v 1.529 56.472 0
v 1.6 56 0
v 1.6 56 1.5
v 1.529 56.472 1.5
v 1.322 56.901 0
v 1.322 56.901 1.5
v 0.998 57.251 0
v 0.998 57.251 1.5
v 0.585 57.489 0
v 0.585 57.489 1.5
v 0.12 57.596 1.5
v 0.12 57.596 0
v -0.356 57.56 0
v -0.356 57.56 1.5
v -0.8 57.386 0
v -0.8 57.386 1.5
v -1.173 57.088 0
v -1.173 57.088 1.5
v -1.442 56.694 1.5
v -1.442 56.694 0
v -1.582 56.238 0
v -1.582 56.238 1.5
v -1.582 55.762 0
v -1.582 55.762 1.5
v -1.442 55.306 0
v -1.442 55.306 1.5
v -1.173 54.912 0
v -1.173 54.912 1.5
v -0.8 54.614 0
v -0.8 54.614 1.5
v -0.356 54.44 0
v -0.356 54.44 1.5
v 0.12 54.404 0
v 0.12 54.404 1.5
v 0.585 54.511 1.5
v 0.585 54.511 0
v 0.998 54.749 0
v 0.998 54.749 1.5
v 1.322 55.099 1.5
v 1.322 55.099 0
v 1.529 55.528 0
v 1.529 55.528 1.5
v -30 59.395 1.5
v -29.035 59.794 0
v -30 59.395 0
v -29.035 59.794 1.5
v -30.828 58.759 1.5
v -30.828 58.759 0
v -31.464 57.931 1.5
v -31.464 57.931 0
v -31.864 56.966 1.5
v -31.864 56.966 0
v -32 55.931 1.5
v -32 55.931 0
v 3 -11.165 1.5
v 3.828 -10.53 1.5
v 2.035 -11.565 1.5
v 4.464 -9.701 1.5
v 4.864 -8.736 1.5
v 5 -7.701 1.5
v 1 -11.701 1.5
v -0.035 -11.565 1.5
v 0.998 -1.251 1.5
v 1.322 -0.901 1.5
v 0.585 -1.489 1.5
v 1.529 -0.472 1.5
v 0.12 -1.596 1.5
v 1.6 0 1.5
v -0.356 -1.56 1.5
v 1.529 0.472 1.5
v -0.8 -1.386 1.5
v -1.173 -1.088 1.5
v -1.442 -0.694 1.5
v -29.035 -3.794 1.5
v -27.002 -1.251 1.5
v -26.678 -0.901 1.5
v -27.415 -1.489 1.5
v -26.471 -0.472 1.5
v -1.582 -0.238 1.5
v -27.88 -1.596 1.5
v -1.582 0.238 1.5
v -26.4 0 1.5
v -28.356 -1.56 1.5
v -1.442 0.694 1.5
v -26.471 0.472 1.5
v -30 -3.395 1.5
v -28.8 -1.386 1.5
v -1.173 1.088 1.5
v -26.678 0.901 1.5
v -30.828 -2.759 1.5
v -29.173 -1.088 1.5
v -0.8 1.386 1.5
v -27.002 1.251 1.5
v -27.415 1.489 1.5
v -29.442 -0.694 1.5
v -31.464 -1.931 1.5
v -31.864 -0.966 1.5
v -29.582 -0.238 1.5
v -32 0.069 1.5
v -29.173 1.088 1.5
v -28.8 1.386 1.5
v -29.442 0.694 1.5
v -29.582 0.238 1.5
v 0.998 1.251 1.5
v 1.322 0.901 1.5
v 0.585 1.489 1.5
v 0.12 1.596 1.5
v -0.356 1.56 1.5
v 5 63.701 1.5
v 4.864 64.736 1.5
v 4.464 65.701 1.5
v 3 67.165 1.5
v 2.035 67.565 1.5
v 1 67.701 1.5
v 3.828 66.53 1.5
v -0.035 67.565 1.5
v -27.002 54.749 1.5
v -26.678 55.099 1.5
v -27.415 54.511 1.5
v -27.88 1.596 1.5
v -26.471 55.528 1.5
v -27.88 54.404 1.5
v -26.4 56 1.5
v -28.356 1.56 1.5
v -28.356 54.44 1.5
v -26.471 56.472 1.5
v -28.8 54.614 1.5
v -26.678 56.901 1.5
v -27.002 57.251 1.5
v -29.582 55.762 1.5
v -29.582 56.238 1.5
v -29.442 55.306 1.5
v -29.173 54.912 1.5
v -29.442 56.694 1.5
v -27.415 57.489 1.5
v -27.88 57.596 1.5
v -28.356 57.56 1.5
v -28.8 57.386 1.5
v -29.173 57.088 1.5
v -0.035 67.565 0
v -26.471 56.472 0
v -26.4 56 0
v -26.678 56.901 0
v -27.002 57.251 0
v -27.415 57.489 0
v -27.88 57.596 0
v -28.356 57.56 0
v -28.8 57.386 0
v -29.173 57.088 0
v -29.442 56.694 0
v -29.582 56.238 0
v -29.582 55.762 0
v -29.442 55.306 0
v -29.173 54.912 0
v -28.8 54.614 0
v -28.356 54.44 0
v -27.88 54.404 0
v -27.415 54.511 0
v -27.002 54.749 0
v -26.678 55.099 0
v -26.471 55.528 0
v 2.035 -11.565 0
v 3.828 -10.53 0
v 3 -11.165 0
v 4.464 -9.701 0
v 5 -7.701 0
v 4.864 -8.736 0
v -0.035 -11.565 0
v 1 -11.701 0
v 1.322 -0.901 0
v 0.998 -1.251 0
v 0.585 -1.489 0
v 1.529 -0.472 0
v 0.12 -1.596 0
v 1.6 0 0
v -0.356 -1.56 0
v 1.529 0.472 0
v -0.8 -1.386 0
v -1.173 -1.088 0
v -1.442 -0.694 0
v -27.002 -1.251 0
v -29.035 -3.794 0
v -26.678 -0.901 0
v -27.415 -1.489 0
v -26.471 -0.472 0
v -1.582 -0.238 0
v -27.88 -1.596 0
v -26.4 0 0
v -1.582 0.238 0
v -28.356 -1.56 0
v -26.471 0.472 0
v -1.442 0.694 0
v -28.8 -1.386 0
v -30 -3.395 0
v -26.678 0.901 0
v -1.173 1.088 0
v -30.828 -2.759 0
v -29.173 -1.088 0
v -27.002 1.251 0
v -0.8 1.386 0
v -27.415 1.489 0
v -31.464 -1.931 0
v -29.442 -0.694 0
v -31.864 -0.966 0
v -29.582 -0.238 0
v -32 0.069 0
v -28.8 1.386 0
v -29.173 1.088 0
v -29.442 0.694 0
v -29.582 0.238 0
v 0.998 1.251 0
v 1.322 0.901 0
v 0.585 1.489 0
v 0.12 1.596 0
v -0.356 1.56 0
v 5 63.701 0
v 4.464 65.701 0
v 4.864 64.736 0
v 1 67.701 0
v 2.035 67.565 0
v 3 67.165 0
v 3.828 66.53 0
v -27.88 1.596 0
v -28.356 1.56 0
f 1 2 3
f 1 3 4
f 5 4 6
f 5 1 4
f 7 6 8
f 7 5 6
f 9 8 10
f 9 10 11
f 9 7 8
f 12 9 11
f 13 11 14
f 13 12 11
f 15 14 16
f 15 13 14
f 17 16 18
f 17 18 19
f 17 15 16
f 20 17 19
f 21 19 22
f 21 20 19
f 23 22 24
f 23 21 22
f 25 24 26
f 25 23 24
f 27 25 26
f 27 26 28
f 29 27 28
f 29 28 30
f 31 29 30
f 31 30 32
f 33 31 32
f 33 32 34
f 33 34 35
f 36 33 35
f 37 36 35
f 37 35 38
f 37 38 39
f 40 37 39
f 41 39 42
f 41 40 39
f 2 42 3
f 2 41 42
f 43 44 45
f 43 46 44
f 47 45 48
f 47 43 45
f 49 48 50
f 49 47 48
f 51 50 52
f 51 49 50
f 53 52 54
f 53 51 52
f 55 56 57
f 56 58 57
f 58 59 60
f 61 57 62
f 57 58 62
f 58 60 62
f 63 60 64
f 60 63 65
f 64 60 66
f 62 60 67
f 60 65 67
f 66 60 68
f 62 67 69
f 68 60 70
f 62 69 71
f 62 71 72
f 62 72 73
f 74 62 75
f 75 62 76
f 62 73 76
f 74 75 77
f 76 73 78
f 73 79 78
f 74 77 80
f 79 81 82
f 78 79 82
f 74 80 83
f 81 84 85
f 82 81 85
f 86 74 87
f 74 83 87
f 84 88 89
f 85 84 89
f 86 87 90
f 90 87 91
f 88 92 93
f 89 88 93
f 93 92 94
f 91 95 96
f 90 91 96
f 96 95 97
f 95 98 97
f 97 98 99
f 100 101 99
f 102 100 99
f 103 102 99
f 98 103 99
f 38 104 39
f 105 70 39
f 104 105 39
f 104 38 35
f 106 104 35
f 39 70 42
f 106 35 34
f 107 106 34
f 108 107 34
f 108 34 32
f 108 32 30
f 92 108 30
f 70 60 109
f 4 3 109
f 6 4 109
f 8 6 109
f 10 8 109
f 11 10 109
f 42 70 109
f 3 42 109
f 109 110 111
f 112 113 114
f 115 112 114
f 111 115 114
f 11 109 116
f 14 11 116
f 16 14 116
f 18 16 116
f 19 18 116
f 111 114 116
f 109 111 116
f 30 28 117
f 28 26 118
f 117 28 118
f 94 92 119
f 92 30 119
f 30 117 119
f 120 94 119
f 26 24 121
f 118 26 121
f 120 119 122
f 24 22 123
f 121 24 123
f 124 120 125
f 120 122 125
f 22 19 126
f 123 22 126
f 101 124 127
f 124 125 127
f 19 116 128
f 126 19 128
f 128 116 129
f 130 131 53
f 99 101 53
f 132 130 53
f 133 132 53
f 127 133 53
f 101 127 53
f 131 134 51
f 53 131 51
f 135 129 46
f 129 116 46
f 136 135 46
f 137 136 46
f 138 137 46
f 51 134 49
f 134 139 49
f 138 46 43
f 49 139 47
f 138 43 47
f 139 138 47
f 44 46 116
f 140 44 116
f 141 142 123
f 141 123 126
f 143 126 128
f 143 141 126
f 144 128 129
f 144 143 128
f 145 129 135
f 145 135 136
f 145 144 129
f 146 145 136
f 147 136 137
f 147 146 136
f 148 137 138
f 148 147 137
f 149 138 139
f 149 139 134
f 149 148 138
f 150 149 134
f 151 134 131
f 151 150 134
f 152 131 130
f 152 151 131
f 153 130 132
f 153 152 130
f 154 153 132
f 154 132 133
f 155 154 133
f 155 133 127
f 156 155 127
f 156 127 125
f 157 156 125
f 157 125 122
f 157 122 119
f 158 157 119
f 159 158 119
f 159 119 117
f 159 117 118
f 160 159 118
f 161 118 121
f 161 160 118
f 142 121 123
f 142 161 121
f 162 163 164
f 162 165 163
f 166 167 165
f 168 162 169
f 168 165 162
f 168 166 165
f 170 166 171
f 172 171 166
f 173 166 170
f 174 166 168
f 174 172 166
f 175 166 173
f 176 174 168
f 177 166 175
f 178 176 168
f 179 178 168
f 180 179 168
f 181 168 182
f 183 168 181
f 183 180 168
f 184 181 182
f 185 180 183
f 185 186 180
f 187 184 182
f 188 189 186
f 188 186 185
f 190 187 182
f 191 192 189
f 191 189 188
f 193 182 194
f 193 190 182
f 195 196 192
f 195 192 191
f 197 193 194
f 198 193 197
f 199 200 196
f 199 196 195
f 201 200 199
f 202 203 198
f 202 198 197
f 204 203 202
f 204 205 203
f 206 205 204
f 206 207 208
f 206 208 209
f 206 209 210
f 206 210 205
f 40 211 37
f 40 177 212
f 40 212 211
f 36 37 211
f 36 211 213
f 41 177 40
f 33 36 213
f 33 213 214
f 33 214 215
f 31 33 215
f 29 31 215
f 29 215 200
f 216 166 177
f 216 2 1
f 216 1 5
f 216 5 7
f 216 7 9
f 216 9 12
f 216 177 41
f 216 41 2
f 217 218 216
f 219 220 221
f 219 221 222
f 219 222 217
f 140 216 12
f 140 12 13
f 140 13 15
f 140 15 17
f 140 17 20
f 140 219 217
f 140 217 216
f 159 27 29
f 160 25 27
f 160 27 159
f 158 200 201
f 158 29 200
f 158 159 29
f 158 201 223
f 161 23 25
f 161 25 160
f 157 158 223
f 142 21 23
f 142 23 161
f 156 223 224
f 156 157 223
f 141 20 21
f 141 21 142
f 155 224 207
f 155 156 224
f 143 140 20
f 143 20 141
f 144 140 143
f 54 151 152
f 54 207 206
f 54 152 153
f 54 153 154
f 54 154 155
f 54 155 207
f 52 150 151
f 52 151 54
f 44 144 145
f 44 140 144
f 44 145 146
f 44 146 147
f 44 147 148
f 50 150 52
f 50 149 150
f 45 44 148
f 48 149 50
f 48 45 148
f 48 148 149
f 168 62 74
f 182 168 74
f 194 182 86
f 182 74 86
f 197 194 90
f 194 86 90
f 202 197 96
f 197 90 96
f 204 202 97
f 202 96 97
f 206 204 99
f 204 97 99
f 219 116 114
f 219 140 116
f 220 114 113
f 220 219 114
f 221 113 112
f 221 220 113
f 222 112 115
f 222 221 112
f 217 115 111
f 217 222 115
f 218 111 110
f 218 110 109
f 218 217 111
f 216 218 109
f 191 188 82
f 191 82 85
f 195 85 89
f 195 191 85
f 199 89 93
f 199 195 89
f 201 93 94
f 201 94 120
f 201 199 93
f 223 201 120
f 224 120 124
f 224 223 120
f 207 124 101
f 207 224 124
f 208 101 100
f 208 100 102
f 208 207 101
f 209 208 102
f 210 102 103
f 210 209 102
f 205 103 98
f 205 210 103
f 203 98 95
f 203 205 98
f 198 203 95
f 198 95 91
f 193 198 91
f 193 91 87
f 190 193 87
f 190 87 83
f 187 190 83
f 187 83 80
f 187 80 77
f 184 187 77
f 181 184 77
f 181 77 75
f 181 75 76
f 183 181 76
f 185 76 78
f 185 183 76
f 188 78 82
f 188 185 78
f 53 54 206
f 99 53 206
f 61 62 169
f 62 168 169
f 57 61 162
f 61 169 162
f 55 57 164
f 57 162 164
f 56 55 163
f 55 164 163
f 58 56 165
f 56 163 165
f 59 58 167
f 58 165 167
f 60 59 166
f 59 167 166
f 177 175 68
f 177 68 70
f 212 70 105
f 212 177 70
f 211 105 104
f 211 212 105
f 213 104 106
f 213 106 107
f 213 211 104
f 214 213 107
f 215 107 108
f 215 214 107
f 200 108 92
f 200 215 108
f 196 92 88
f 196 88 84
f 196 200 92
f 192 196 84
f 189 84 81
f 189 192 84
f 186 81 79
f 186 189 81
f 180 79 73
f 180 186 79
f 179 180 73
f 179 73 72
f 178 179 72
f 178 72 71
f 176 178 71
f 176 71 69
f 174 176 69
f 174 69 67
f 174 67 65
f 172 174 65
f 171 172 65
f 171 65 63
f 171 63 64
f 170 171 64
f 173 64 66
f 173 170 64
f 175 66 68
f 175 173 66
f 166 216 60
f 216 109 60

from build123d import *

# Parameters (mm, degrees)
SKETCH1_R           = 1.6
BOSS_EXTRUDE1_DEPTH = 1.5
CUT_EXTRUDE1_DEPTH  = 1.5
BOSS_EXTRUDE2_DEPTH = 1.5
FILLET1_R           = 4


with BuildPart() as part:
    # Sketch1 → Boss-Extrude1 (new body)
    with BuildSketch(Plane.XY):
        Polygon((5, 59), (-32, 72.466898668), (-32, 56), (-32, 0), (-32, -16.466898668), (5, -3), align=None)
        Circle(SKETCH1_R, mode=Mode.SUBTRACT)
        with Locations((-28, 0)):
            Circle(SKETCH1_R, mode=Mode.SUBTRACT)
        with Locations((0, 56)):
            Circle(SKETCH1_R, mode=Mode.SUBTRACT)
        with Locations((-28, 56)):
            Circle(SKETCH1_R, mode=Mode.SUBTRACT)
    extrude(amount=BOSS_EXTRUDE1_DEPTH)

    # Sketch2 → Cut-Extrude1 (cut)
    with BuildSketch(Plane.XY.offset(1.5)):
        Polygon((5, 59), (-43.875673323, 59), (-43.875673323, 79.145449881), (45.915909875, 71.47170947), align=None)
        Polygon((5, -3), (-36.907564214, -3), (-45.551547665, -23.435700668), (23.159300381, -21.407010674), align=None)
    extrude(amount=-CUT_EXTRUDE1_DEPTH, mode=Mode.SUBTRACT)

    # Sketch3 → Boss-Extrude2 (add)
    with BuildSketch(Plane.XY.offset(1.5)):
        Polygon((-32, 59), (5, 68.91412012), (5, 59), align=None)
        Polygon((5, -3), (5, -12.91412012), (-32, -3), align=None)
    extrude(amount=-BOSS_EXTRUDE2_DEPTH)

    # Fillet1
    fillet1_edges = [part.edges().sort_by_distance(p)[0] for p in [
        (-32, 59, 0.75),
        (-32, -3, 0.75),
        (5, 68.91412012, 0.75),
        (5, -12.91412012, 0.75),
    ]]
    fillet(fillet1_edges, radius=FILLET1_R)


solid = part.part
